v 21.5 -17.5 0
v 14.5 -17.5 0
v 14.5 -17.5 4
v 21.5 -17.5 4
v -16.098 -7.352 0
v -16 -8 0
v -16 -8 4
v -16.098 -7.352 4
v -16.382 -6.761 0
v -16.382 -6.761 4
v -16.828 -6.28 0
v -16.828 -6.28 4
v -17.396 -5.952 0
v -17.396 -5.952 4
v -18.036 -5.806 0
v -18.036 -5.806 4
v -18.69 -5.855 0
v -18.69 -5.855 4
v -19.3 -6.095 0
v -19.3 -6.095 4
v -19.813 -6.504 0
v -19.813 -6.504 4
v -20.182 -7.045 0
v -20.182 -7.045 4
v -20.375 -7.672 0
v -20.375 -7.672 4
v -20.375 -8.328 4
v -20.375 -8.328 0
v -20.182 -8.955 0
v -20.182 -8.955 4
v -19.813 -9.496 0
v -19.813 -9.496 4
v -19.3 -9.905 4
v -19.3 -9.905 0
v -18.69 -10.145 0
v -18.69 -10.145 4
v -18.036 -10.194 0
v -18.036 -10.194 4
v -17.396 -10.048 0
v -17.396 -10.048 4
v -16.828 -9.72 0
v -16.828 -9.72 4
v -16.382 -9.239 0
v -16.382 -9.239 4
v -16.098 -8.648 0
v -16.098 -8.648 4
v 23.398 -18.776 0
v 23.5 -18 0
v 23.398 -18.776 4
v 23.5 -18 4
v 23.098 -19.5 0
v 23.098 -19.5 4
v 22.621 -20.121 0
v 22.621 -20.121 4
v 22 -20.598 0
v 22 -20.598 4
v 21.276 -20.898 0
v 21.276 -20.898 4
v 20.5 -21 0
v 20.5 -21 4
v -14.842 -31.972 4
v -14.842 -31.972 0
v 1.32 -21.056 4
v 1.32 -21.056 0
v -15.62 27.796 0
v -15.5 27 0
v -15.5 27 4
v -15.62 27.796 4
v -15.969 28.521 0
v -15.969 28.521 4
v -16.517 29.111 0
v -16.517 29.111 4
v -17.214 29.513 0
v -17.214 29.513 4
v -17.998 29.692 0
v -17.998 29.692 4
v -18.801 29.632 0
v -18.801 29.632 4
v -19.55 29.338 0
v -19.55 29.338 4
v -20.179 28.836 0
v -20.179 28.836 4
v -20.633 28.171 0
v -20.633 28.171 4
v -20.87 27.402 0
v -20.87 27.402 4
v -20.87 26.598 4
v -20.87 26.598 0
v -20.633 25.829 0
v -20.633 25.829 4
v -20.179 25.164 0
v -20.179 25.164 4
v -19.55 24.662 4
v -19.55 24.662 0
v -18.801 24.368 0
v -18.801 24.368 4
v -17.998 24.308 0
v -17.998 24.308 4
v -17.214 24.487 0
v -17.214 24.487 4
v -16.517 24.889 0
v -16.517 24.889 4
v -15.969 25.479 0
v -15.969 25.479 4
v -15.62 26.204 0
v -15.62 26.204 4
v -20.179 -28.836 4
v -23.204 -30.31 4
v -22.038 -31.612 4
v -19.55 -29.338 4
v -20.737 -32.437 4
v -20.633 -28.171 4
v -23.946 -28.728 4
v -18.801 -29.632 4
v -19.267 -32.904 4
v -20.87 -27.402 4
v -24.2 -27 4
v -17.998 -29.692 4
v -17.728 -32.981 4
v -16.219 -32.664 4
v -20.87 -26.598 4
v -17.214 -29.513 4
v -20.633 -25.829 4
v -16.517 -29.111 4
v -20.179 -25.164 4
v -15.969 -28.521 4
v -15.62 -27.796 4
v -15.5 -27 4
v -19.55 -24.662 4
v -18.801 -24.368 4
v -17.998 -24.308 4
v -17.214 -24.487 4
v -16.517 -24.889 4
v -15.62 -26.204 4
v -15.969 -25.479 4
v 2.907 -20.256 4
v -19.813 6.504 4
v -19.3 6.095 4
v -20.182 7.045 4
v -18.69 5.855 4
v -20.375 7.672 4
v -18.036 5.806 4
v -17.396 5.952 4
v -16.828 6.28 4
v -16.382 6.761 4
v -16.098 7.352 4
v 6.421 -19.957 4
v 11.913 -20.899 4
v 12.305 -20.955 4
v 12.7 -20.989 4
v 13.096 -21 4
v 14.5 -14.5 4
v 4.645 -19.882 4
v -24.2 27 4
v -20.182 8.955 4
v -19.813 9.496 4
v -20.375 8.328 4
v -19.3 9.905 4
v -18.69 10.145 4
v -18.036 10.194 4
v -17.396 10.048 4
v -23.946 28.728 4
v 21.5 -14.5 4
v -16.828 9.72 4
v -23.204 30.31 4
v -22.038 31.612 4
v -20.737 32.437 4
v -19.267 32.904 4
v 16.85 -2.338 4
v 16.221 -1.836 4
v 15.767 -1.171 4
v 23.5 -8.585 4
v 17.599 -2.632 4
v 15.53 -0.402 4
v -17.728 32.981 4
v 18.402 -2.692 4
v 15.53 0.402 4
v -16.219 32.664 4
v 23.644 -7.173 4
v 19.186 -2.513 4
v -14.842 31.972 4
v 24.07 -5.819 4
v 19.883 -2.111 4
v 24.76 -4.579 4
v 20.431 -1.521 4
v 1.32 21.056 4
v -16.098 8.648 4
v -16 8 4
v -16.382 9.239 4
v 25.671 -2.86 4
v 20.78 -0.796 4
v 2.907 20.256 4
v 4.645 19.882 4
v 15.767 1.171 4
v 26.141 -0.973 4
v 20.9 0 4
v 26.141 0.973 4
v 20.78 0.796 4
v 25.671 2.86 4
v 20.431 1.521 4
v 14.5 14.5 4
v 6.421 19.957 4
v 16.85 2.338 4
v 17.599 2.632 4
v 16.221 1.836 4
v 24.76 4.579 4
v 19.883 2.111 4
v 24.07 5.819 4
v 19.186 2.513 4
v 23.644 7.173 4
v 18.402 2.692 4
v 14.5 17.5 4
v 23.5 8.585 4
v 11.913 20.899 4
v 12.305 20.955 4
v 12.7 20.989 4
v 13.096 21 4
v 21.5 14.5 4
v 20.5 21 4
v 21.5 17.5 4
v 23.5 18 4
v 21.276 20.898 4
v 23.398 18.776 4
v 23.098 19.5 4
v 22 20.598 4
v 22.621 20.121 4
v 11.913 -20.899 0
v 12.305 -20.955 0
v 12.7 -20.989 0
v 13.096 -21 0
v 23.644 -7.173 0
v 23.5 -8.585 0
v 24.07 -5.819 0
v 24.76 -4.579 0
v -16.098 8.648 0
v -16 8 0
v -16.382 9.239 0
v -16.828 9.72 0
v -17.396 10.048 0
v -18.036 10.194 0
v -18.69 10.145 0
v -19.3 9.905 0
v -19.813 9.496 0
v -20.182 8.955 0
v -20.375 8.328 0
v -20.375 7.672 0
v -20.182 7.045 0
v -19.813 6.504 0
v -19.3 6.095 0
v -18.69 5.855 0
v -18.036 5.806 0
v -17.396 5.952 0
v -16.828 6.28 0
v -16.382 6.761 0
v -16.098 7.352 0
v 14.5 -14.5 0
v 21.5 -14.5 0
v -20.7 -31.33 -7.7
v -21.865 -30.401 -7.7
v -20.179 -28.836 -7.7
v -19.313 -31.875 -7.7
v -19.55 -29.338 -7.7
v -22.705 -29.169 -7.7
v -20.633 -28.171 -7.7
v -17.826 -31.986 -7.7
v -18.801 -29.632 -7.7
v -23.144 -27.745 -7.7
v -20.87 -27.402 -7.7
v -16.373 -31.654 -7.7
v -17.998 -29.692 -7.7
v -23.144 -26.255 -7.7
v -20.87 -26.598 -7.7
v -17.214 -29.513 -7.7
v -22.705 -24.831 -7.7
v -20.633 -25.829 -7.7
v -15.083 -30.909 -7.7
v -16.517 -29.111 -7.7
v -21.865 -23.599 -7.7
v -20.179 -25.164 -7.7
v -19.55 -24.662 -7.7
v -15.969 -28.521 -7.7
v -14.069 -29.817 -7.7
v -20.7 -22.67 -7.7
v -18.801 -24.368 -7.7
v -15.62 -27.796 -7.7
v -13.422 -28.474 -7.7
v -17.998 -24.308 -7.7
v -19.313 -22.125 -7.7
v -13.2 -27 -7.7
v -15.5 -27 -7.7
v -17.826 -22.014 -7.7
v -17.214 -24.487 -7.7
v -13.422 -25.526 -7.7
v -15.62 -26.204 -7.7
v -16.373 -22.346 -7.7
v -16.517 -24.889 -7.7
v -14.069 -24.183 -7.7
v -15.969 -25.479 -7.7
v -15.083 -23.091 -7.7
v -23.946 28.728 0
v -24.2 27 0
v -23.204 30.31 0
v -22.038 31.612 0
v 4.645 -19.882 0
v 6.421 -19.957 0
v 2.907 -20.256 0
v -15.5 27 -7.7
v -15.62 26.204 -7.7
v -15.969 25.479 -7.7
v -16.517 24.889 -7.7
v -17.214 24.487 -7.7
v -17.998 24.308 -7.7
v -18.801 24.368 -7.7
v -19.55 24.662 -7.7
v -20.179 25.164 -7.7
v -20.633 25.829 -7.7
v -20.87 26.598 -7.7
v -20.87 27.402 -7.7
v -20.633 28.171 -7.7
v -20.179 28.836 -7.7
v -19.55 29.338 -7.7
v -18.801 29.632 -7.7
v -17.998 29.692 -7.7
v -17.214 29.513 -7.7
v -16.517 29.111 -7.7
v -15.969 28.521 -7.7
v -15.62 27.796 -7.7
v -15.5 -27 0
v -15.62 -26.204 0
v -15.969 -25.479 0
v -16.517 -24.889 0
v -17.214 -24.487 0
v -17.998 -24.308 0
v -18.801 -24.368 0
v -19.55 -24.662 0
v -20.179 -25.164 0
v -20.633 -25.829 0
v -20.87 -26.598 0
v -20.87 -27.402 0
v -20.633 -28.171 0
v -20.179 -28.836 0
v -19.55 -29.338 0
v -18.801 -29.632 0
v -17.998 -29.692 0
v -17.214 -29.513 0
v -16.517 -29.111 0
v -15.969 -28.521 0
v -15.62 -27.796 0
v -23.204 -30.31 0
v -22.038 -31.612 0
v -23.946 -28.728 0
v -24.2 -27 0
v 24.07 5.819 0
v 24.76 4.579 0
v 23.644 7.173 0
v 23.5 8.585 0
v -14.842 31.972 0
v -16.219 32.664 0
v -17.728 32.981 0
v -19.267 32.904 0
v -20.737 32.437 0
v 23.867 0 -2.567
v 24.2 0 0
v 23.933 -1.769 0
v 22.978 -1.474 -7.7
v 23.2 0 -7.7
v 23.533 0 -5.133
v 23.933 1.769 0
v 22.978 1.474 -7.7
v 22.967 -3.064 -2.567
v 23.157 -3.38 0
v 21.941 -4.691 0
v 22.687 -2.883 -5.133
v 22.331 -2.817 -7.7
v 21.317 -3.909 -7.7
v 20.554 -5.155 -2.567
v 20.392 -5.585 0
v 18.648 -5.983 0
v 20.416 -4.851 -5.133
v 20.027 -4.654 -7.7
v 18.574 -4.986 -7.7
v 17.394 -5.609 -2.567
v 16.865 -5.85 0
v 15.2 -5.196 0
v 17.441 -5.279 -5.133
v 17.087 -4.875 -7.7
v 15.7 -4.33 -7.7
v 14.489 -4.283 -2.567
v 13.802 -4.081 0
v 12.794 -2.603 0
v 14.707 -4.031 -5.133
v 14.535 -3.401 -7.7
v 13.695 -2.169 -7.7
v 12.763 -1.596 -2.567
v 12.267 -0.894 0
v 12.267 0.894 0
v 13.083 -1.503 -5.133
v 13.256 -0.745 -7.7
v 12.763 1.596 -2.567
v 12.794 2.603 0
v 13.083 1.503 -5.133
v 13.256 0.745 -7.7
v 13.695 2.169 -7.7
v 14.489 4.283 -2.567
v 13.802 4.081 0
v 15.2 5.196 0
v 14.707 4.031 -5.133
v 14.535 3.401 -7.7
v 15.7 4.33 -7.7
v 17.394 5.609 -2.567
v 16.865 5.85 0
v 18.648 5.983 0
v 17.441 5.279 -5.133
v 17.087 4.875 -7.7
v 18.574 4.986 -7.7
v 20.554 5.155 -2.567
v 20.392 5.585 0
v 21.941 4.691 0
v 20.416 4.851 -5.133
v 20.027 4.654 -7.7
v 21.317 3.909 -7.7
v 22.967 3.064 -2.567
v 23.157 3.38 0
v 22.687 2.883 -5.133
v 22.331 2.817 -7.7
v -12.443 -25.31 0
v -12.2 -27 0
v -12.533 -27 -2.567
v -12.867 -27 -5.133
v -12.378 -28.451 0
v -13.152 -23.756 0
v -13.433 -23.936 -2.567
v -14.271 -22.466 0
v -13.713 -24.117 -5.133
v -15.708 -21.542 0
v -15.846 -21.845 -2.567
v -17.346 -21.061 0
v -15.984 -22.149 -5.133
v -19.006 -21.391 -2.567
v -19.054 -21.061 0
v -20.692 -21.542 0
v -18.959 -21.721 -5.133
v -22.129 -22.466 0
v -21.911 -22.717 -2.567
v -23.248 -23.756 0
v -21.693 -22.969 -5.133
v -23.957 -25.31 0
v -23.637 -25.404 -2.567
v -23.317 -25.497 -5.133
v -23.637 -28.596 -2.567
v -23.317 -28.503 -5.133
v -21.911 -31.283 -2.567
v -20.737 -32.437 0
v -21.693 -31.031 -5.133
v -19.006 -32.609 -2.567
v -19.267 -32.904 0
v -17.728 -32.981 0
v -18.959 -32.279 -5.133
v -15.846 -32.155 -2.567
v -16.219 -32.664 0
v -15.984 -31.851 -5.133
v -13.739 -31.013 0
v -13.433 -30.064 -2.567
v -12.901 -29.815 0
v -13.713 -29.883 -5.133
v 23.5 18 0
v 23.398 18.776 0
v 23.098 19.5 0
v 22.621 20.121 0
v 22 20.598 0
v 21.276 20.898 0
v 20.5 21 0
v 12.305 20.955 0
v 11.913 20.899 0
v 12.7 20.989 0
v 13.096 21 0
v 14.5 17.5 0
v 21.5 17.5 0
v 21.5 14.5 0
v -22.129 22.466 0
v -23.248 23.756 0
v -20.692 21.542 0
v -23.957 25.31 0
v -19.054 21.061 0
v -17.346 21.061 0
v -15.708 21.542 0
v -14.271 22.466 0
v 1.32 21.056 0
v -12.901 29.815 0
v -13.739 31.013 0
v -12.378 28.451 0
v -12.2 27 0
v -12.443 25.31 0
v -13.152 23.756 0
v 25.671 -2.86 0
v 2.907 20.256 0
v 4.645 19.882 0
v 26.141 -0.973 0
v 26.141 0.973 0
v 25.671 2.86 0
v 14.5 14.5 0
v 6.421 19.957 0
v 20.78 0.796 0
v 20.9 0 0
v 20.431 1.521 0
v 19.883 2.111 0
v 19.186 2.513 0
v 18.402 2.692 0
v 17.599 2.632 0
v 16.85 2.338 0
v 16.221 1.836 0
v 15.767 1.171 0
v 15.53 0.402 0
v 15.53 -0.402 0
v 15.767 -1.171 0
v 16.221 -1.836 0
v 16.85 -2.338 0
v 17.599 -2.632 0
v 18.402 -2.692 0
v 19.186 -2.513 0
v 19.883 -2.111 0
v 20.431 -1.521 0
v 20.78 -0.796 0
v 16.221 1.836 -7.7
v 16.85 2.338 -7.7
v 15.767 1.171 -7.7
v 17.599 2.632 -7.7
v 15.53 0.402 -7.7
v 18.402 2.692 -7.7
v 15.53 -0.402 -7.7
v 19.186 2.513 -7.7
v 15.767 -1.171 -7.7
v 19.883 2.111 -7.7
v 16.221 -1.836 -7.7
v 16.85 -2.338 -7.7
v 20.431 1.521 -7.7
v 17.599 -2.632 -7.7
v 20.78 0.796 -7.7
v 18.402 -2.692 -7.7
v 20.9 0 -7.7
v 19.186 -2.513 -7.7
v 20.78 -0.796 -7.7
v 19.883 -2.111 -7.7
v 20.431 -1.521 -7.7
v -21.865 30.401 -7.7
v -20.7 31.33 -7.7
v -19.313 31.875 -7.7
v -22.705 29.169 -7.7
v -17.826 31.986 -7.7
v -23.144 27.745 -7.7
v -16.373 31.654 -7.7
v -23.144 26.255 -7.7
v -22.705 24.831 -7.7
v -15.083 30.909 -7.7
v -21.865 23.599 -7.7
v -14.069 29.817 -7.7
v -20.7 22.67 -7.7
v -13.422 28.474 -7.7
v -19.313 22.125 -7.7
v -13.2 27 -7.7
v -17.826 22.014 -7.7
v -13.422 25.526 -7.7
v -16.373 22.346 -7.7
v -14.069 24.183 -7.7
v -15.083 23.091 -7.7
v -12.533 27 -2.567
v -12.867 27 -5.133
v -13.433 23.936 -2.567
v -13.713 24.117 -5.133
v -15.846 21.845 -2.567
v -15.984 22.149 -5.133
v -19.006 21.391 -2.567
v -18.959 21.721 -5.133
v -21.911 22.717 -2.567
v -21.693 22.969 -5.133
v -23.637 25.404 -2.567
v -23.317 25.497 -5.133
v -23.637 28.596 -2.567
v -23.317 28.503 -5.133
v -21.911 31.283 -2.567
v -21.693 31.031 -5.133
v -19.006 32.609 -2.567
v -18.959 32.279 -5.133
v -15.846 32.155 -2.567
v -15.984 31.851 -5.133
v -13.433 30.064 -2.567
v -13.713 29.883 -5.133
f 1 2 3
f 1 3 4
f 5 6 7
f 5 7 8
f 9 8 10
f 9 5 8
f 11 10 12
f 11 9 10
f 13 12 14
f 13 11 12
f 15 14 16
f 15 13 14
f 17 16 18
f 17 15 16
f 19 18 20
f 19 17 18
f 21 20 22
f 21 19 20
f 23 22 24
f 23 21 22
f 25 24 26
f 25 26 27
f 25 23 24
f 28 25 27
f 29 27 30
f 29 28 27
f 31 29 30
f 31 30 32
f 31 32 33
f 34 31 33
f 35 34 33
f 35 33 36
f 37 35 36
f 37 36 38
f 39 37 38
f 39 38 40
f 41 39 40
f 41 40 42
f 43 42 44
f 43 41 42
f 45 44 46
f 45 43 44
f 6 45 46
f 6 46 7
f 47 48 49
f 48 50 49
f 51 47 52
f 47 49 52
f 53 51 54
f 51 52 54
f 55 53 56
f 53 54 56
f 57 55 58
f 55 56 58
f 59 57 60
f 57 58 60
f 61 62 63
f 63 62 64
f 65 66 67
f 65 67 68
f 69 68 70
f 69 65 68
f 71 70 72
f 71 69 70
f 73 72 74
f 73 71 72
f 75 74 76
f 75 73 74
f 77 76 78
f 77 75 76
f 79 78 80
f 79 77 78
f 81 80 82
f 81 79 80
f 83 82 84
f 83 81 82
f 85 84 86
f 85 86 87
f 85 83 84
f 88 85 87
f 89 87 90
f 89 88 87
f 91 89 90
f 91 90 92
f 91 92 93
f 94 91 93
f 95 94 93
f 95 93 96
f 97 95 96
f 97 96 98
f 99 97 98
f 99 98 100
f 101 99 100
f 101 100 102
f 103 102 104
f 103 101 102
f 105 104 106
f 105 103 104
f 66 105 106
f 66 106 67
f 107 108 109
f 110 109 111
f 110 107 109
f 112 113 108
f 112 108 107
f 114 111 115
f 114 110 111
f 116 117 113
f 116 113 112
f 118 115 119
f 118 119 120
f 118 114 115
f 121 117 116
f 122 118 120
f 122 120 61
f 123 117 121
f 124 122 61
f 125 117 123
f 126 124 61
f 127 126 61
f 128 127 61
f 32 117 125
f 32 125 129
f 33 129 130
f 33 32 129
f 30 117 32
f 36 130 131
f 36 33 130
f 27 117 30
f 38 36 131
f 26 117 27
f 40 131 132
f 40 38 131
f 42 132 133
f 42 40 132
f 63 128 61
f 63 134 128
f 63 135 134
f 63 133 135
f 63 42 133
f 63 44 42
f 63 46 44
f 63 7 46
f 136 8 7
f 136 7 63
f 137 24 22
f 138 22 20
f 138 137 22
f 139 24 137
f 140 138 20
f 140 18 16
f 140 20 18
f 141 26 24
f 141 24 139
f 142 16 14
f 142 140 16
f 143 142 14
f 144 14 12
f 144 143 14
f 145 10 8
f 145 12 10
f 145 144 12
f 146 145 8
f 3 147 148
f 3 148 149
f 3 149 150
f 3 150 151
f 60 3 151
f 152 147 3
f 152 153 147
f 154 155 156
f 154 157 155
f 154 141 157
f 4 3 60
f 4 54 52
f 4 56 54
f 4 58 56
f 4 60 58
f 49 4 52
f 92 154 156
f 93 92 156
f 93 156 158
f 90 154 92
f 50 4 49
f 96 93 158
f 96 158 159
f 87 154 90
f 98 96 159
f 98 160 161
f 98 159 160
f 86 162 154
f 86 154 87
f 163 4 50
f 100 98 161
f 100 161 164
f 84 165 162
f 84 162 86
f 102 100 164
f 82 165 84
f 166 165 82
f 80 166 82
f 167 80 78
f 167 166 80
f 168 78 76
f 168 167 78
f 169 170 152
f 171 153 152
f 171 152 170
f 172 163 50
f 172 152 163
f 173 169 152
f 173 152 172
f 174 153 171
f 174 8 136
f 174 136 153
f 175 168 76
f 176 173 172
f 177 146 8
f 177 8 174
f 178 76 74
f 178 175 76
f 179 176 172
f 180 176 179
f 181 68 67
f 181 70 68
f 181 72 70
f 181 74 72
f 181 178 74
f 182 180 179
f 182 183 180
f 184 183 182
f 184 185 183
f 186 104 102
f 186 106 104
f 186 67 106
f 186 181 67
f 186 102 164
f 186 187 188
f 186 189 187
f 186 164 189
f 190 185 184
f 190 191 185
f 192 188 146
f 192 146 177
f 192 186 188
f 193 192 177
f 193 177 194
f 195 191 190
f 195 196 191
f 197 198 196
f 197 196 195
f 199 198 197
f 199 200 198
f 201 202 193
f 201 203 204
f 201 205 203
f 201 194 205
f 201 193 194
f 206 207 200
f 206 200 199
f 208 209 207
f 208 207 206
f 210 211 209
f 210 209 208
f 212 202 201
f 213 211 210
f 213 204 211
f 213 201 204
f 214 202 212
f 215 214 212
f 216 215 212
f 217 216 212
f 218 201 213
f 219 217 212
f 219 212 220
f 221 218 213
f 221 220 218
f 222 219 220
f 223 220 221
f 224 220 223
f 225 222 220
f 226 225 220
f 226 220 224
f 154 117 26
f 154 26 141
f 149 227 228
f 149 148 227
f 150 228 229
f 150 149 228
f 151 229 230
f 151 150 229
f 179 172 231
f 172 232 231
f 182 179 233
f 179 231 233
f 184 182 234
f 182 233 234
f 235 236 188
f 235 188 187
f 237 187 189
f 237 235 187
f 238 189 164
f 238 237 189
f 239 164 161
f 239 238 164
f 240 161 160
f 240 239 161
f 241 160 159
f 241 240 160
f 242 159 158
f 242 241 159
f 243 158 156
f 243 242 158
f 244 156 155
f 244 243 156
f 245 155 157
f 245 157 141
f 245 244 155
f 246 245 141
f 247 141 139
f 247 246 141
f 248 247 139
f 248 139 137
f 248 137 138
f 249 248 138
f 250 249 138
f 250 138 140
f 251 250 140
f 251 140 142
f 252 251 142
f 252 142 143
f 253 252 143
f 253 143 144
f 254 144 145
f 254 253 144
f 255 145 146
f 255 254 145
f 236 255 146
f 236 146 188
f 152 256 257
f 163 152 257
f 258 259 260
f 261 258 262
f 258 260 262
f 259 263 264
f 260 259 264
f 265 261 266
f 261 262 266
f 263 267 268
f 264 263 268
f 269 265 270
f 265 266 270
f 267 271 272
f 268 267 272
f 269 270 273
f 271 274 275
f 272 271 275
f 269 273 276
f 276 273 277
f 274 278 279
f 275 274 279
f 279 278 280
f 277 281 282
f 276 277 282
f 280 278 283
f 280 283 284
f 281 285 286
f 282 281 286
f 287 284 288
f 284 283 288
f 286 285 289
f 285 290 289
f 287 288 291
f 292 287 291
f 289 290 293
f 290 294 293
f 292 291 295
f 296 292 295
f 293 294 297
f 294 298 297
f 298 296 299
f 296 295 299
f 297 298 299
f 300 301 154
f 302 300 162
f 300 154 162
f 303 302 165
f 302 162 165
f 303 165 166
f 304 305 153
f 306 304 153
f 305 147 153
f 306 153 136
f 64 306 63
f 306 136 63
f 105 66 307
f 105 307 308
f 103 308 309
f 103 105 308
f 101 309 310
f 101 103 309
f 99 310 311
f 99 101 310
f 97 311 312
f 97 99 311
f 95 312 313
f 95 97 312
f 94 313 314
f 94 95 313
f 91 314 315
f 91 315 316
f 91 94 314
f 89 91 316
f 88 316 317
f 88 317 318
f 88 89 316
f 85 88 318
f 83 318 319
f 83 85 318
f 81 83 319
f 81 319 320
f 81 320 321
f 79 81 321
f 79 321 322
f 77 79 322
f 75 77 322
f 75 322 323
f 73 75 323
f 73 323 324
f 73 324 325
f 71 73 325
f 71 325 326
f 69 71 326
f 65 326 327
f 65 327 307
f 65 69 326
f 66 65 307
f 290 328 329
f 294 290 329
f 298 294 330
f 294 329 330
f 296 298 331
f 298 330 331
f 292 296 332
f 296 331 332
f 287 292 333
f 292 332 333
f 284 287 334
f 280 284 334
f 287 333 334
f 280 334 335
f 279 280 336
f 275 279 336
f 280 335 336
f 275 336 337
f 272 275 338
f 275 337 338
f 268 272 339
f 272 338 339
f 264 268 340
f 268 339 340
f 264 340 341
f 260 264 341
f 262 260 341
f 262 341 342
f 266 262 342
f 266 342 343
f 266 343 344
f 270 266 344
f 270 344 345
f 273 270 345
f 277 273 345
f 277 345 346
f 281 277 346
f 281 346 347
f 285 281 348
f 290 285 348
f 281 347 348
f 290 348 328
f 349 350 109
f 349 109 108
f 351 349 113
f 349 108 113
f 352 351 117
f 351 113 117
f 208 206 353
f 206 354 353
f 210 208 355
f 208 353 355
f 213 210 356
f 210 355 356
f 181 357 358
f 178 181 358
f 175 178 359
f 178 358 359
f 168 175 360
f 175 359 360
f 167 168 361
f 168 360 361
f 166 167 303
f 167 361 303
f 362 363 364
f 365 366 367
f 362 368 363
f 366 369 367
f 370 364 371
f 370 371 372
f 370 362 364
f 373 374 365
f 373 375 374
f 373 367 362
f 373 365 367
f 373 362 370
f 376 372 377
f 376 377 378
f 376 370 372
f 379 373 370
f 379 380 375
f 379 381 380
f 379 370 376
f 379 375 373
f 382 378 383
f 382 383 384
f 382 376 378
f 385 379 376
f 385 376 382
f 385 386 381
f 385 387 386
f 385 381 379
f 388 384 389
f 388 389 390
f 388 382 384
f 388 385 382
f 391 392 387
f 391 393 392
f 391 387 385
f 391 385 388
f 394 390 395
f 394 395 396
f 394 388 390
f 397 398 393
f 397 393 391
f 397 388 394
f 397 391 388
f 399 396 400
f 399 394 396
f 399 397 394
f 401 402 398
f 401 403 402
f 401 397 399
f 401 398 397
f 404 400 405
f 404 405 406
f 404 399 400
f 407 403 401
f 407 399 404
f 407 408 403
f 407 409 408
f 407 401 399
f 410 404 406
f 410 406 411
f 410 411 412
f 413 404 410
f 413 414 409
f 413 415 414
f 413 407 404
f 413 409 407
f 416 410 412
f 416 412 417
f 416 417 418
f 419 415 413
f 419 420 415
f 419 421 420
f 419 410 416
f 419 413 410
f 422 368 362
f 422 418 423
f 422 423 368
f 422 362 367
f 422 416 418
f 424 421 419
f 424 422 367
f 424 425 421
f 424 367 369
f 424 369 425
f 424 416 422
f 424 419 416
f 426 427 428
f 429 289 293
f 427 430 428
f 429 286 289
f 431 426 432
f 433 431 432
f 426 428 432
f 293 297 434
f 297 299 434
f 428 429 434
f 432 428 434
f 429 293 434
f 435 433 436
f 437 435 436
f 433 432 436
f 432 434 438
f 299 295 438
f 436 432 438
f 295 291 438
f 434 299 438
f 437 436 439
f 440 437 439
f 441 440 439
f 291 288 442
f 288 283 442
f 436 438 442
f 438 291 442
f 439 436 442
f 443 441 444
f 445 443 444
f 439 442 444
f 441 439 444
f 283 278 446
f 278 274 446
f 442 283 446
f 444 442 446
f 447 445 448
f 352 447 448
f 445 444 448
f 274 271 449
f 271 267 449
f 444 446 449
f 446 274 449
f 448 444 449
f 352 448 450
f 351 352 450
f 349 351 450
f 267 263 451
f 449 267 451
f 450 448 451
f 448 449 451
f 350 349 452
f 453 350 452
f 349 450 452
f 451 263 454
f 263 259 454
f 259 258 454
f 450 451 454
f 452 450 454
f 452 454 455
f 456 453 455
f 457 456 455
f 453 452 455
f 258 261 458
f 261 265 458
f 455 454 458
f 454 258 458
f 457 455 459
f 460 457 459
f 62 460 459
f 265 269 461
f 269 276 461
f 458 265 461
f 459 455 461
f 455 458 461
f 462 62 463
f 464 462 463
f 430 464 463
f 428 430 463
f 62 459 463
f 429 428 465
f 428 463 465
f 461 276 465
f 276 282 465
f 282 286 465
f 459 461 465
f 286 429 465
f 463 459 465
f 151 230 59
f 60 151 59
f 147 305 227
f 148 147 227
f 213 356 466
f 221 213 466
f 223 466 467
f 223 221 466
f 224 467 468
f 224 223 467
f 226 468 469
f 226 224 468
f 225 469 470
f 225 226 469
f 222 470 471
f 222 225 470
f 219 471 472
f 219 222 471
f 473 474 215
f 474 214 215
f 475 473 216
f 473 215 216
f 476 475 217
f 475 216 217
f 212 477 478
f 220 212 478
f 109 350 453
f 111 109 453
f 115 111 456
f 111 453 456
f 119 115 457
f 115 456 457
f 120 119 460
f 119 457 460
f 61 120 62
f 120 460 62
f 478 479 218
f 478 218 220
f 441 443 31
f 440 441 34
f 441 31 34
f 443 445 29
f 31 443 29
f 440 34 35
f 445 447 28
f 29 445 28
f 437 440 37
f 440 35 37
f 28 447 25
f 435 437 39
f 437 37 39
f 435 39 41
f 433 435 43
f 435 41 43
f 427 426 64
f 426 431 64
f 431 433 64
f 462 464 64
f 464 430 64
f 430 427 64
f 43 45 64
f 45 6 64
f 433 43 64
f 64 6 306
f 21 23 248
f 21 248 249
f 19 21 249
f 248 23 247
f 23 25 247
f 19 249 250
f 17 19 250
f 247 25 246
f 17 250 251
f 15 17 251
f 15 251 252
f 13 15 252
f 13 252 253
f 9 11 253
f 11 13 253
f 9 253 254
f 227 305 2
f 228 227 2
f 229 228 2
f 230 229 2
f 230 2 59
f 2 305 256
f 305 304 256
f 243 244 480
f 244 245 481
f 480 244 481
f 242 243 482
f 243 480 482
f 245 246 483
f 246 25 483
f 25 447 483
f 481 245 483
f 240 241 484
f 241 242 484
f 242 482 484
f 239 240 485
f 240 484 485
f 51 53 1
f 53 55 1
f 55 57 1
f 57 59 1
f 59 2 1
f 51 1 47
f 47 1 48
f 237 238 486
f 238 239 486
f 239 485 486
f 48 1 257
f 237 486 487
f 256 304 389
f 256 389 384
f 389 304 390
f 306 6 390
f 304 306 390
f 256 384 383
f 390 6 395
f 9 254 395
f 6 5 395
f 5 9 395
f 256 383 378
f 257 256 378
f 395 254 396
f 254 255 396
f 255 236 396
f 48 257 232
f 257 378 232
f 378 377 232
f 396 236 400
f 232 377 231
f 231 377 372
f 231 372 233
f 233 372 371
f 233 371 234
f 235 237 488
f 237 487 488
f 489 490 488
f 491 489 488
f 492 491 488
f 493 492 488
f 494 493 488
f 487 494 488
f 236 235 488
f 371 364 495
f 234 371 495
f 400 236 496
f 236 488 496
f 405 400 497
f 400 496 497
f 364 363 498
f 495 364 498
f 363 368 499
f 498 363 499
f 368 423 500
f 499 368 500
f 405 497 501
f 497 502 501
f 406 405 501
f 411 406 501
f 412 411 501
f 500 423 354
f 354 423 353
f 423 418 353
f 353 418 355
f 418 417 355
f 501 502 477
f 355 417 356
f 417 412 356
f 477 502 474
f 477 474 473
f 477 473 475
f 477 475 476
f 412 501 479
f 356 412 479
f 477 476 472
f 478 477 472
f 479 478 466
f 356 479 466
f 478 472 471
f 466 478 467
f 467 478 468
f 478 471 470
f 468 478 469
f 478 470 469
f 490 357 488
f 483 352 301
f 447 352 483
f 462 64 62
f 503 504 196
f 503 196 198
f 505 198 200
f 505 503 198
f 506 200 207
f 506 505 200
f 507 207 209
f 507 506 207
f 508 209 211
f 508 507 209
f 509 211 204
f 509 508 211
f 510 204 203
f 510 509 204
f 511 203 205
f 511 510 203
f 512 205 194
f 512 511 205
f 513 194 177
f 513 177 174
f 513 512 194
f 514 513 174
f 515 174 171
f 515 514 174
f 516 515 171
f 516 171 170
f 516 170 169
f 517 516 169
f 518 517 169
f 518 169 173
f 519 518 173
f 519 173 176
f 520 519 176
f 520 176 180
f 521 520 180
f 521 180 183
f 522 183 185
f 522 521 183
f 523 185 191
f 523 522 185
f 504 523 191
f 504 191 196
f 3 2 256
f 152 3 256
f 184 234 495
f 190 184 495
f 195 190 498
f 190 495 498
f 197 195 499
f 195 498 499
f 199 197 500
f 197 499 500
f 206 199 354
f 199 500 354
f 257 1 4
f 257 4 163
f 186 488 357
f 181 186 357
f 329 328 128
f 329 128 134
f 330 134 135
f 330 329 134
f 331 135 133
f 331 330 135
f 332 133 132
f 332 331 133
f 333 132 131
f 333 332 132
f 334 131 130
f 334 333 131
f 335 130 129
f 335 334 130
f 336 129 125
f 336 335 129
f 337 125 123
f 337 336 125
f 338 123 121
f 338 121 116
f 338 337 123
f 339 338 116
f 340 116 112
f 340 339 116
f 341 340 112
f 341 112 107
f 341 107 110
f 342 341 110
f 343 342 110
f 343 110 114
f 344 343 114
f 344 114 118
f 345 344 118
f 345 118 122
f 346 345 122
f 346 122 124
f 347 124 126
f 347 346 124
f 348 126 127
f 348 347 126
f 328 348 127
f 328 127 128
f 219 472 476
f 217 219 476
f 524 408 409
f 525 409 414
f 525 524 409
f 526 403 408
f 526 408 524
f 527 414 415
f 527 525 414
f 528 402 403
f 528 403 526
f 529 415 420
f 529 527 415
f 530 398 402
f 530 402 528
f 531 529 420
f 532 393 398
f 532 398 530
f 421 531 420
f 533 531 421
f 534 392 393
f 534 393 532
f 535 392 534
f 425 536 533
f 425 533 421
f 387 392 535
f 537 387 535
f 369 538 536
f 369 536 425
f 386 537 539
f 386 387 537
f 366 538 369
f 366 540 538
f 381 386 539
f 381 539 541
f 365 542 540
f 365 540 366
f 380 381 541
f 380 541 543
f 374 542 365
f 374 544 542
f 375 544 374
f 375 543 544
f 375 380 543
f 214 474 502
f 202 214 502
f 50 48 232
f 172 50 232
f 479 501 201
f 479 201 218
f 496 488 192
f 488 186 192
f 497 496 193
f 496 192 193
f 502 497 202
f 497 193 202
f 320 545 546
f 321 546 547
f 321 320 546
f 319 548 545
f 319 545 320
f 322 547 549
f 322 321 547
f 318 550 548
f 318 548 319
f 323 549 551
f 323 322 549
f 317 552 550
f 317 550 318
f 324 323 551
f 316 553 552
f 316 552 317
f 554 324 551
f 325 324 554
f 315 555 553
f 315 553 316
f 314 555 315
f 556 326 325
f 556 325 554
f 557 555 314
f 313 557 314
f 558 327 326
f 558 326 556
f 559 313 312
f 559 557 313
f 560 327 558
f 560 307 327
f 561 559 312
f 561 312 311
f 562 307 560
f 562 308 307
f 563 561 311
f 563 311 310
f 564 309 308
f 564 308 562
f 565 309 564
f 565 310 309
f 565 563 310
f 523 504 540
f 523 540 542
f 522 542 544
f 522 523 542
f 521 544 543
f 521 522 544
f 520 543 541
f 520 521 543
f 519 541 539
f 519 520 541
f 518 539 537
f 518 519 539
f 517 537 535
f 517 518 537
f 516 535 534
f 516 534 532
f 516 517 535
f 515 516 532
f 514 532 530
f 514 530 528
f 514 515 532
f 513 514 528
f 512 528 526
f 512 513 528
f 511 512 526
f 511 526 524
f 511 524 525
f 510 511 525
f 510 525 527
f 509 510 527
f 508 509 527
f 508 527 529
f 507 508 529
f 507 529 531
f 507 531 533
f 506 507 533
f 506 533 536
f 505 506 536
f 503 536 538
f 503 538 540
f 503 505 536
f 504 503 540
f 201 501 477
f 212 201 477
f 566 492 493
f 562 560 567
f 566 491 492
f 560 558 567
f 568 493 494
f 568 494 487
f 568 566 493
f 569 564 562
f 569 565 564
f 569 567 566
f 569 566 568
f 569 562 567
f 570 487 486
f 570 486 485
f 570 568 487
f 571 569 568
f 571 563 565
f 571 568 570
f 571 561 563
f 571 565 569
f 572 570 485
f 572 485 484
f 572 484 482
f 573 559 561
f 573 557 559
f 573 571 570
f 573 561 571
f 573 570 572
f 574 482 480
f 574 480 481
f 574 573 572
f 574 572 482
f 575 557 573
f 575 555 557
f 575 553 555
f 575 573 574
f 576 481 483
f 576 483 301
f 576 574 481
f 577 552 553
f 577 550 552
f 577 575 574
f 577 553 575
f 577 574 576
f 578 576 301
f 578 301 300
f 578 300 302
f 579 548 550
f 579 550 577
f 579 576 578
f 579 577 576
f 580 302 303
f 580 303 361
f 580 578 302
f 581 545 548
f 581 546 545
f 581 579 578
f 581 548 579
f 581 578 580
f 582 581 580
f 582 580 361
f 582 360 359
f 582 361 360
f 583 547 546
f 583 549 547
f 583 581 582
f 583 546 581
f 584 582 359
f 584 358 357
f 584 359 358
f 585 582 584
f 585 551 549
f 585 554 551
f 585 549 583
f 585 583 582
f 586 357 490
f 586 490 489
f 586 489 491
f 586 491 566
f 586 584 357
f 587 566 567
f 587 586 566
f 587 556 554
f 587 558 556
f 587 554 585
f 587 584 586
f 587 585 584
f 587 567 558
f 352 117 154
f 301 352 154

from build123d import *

# Parameters (mm, degrees)
SKETCH_1_R          = 2.2
SKETCH_1_R_2        = 2.7
EXTRUDE_1_DEPTH     = 4
CUT_EXTRUDE_1_REACH = 59.017
EXTRUDE_START       = -4
SKETCH_6_W          = 7
SKETCH_6_H          = 3
SKETCH_6_R          = 2.7
EXTRUDE_3_DEPTH     = 4
FILLET_1_R          = 7
FILLET_2_R          = 3


with BuildPart() as part:
    # 草图1 → 凸台-拉伸1 (new body)
    with BuildSketch(Plane.XY):
        with BuildLine():
            Line((-22.03836949, 31.611607058), (-45, 12.5))
            Line((-45, 12.5), (-45, -12.5))
            Line((-45, -12.5), (-22.03836949, -31.611607058))
            ThreePointArc((-22.03836949, -31.611607058), (-18.500125226, -32.992489036), (-14.841614052, -31.972046241))
            Line((-14.841614052, -31.972046241), (22.677847931, -6.629394988))
            ThreePointArc((22.677847931, -6.629394988), (26.2, 0), (22.677847931, 6.629394988))
            Line((22.677847931, 6.629394988), (-14.841614052, 31.972046241))
            ThreePointArc((-14.841614052, 31.972046241), (-18.500125226, 32.992489036), (-22.03836949, 31.611607058))
        make_face()
        with Locations((-18.2, -8)):
            Circle(SKETCH_1_R, mode=Mode.SUBTRACT)
        with Locations((-18.2, 8)):
            Circle(SKETCH_1_R, mode=Mode.SUBTRACT)
        with Locations((-34.2, 0)):
            Circle(SKETCH_1_R, mode=Mode.SUBTRACT)
        with Locations((-18.2, 27)):
            Circle(SKETCH_1_R_2, mode=Mode.SUBTRACT)
        with Locations((-18.2, -27)):
            Circle(SKETCH_1_R_2, mode=Mode.SUBTRACT)
        with Locations((18.2, 0)):
            Circle(SKETCH_1_R_2, mode=Mode.SUBTRACT)
    extrude(amount=EXTRUDE_1_DEPTH)

    # 草图4 → 旋转1 (revolve)
    with BuildSketch(Plane(origin=(-25.021499827, 16.900859193, 0), x_dir=(0, 0, -1), z_dir=(0.8286743735186554, -0.5597309913462574, 0)), mode=Mode.PRIVATE) as revolve_1_sk:
        Polygon((7.7, 17.187104043), (7.7, 14.887104043), (0, 14.887104043), (0, 18.187104043), align=None)
    revolve_1 = revolve(revolve_1_sk.sketch.rotate(Axis((-18.2, 27, 1000.278995542), (0, 0, -1)), 55.962803956), axis=Axis((-18.2, 27, 1000.278995542), (0, 0, -1)))

    # 镜向1: 旋转1 across plane
    add(revolve_1.mirror(Plane.ZX))

    # 草图5 → 切除-拉伸1 (cut, up to next)
    with BuildSketch(Plane.XY.offset(4), mode=Mode.PRIVATE) as cut_extrude_1_sk1:
        with BuildLine():
            Line((-24.2, -27), (-24.2, 27))
            ThreePointArc((-24.2, 27), (-23.632780915, 29.546545018), (-22.03836949, 31.611607058))
            Line((-22.03836949, 31.611607058), (-45, 12.5))
            Line((-45, 12.5), (-45, -12.5))
            Line((-45, -12.5), (-22.03836949, -31.611607058))
            ThreePointArc((-22.03836949, -31.611607058), (-23.632780915, -29.546545018), (-24.2, -27))
        make_face()
    cut_extrude_1_tool1 = extrude(cut_extrude_1_sk1.sketch, amount=-CUT_EXTRUDE_1_REACH, mode=Mode.PRIVATE) & part.part
    add(cut_extrude_1_tool1.solids().sort_by_distance((-33.15819, 0, 4))[0], mode=Mode.SUBTRACT)

    # 草图6 → 凸台-拉伸3 (add)
    with BuildSketch(Plane.XY.offset(4).offset(EXTRUDE_START)):
        Polygon((12.5, -13.504057816), (3.649903477, -19.481886332), (12.5, -21), (23.5, -21), (23.5, 21), (12.5, 21), (3.649903477, 19.481886332), (12.5, 13.504057816), align=None)
        with Locations((18, -16)):
            Rectangle(SKETCH_6_W, SKETCH_6_H, mode=Mode.SUBTRACT)
        with Locations((18.2, 0)):
            Circle(SKETCH_6_R, mode=Mode.SUBTRACT)
        with Locations((18, 16)):
            Rectangle(SKETCH_6_W, SKETCH_6_H, mode=Mode.SUBTRACT)
    extrude(amount=EXTRUDE_3_DEPTH)

    # 圆角1
    fillet_1_edges = [part.edges().sort_by_distance(p)[0] for p in [
        (12.5, -21, 2),
        (3.649903477, -19.481886332, 2),
        (23.5, -5.992495307, 2),
        (23.5, 5.992495307, 2),
        (12.5, 21, 2),
        (3.649903477, 19.481886332, 2),
    ]]
    fillet(fillet_1_edges, radius=FILLET_1_R)

    # 圆角2
    fillet_2_edges = [part.edges().sort_by_distance(p)[0] for p in [
        (23.5, -21, 2),
        (23.5, 21, 2),
    ]]
    fillet(fillet_2_edges, radius=FILLET_2_R)

    # 草图7 → 旋转2 (revolve)
    with BuildSketch(Plane(origin=(6.459619467, 8.708524022, 0), x_dir=(0.8031661431318494, -0.5957551061692293, 0), z_dir=(0.5957551061692293, 0.8031661431318494, 0)), mode=Mode.PRIVATE) as revolve_2_sk:
        Polygon((11.917623805, 7.7), (11.917623805, 0), (8.617623805, 0), (9.617623805, 7.7), align=None)
    revolve(revolve_2_sk.sketch.rotate(Axis((18.2, 0, 0), (0, 0, -1)), 143.433519356), axis=Axis((18.2, 0, 0), (0, 0, -1)))


solid = part.part
